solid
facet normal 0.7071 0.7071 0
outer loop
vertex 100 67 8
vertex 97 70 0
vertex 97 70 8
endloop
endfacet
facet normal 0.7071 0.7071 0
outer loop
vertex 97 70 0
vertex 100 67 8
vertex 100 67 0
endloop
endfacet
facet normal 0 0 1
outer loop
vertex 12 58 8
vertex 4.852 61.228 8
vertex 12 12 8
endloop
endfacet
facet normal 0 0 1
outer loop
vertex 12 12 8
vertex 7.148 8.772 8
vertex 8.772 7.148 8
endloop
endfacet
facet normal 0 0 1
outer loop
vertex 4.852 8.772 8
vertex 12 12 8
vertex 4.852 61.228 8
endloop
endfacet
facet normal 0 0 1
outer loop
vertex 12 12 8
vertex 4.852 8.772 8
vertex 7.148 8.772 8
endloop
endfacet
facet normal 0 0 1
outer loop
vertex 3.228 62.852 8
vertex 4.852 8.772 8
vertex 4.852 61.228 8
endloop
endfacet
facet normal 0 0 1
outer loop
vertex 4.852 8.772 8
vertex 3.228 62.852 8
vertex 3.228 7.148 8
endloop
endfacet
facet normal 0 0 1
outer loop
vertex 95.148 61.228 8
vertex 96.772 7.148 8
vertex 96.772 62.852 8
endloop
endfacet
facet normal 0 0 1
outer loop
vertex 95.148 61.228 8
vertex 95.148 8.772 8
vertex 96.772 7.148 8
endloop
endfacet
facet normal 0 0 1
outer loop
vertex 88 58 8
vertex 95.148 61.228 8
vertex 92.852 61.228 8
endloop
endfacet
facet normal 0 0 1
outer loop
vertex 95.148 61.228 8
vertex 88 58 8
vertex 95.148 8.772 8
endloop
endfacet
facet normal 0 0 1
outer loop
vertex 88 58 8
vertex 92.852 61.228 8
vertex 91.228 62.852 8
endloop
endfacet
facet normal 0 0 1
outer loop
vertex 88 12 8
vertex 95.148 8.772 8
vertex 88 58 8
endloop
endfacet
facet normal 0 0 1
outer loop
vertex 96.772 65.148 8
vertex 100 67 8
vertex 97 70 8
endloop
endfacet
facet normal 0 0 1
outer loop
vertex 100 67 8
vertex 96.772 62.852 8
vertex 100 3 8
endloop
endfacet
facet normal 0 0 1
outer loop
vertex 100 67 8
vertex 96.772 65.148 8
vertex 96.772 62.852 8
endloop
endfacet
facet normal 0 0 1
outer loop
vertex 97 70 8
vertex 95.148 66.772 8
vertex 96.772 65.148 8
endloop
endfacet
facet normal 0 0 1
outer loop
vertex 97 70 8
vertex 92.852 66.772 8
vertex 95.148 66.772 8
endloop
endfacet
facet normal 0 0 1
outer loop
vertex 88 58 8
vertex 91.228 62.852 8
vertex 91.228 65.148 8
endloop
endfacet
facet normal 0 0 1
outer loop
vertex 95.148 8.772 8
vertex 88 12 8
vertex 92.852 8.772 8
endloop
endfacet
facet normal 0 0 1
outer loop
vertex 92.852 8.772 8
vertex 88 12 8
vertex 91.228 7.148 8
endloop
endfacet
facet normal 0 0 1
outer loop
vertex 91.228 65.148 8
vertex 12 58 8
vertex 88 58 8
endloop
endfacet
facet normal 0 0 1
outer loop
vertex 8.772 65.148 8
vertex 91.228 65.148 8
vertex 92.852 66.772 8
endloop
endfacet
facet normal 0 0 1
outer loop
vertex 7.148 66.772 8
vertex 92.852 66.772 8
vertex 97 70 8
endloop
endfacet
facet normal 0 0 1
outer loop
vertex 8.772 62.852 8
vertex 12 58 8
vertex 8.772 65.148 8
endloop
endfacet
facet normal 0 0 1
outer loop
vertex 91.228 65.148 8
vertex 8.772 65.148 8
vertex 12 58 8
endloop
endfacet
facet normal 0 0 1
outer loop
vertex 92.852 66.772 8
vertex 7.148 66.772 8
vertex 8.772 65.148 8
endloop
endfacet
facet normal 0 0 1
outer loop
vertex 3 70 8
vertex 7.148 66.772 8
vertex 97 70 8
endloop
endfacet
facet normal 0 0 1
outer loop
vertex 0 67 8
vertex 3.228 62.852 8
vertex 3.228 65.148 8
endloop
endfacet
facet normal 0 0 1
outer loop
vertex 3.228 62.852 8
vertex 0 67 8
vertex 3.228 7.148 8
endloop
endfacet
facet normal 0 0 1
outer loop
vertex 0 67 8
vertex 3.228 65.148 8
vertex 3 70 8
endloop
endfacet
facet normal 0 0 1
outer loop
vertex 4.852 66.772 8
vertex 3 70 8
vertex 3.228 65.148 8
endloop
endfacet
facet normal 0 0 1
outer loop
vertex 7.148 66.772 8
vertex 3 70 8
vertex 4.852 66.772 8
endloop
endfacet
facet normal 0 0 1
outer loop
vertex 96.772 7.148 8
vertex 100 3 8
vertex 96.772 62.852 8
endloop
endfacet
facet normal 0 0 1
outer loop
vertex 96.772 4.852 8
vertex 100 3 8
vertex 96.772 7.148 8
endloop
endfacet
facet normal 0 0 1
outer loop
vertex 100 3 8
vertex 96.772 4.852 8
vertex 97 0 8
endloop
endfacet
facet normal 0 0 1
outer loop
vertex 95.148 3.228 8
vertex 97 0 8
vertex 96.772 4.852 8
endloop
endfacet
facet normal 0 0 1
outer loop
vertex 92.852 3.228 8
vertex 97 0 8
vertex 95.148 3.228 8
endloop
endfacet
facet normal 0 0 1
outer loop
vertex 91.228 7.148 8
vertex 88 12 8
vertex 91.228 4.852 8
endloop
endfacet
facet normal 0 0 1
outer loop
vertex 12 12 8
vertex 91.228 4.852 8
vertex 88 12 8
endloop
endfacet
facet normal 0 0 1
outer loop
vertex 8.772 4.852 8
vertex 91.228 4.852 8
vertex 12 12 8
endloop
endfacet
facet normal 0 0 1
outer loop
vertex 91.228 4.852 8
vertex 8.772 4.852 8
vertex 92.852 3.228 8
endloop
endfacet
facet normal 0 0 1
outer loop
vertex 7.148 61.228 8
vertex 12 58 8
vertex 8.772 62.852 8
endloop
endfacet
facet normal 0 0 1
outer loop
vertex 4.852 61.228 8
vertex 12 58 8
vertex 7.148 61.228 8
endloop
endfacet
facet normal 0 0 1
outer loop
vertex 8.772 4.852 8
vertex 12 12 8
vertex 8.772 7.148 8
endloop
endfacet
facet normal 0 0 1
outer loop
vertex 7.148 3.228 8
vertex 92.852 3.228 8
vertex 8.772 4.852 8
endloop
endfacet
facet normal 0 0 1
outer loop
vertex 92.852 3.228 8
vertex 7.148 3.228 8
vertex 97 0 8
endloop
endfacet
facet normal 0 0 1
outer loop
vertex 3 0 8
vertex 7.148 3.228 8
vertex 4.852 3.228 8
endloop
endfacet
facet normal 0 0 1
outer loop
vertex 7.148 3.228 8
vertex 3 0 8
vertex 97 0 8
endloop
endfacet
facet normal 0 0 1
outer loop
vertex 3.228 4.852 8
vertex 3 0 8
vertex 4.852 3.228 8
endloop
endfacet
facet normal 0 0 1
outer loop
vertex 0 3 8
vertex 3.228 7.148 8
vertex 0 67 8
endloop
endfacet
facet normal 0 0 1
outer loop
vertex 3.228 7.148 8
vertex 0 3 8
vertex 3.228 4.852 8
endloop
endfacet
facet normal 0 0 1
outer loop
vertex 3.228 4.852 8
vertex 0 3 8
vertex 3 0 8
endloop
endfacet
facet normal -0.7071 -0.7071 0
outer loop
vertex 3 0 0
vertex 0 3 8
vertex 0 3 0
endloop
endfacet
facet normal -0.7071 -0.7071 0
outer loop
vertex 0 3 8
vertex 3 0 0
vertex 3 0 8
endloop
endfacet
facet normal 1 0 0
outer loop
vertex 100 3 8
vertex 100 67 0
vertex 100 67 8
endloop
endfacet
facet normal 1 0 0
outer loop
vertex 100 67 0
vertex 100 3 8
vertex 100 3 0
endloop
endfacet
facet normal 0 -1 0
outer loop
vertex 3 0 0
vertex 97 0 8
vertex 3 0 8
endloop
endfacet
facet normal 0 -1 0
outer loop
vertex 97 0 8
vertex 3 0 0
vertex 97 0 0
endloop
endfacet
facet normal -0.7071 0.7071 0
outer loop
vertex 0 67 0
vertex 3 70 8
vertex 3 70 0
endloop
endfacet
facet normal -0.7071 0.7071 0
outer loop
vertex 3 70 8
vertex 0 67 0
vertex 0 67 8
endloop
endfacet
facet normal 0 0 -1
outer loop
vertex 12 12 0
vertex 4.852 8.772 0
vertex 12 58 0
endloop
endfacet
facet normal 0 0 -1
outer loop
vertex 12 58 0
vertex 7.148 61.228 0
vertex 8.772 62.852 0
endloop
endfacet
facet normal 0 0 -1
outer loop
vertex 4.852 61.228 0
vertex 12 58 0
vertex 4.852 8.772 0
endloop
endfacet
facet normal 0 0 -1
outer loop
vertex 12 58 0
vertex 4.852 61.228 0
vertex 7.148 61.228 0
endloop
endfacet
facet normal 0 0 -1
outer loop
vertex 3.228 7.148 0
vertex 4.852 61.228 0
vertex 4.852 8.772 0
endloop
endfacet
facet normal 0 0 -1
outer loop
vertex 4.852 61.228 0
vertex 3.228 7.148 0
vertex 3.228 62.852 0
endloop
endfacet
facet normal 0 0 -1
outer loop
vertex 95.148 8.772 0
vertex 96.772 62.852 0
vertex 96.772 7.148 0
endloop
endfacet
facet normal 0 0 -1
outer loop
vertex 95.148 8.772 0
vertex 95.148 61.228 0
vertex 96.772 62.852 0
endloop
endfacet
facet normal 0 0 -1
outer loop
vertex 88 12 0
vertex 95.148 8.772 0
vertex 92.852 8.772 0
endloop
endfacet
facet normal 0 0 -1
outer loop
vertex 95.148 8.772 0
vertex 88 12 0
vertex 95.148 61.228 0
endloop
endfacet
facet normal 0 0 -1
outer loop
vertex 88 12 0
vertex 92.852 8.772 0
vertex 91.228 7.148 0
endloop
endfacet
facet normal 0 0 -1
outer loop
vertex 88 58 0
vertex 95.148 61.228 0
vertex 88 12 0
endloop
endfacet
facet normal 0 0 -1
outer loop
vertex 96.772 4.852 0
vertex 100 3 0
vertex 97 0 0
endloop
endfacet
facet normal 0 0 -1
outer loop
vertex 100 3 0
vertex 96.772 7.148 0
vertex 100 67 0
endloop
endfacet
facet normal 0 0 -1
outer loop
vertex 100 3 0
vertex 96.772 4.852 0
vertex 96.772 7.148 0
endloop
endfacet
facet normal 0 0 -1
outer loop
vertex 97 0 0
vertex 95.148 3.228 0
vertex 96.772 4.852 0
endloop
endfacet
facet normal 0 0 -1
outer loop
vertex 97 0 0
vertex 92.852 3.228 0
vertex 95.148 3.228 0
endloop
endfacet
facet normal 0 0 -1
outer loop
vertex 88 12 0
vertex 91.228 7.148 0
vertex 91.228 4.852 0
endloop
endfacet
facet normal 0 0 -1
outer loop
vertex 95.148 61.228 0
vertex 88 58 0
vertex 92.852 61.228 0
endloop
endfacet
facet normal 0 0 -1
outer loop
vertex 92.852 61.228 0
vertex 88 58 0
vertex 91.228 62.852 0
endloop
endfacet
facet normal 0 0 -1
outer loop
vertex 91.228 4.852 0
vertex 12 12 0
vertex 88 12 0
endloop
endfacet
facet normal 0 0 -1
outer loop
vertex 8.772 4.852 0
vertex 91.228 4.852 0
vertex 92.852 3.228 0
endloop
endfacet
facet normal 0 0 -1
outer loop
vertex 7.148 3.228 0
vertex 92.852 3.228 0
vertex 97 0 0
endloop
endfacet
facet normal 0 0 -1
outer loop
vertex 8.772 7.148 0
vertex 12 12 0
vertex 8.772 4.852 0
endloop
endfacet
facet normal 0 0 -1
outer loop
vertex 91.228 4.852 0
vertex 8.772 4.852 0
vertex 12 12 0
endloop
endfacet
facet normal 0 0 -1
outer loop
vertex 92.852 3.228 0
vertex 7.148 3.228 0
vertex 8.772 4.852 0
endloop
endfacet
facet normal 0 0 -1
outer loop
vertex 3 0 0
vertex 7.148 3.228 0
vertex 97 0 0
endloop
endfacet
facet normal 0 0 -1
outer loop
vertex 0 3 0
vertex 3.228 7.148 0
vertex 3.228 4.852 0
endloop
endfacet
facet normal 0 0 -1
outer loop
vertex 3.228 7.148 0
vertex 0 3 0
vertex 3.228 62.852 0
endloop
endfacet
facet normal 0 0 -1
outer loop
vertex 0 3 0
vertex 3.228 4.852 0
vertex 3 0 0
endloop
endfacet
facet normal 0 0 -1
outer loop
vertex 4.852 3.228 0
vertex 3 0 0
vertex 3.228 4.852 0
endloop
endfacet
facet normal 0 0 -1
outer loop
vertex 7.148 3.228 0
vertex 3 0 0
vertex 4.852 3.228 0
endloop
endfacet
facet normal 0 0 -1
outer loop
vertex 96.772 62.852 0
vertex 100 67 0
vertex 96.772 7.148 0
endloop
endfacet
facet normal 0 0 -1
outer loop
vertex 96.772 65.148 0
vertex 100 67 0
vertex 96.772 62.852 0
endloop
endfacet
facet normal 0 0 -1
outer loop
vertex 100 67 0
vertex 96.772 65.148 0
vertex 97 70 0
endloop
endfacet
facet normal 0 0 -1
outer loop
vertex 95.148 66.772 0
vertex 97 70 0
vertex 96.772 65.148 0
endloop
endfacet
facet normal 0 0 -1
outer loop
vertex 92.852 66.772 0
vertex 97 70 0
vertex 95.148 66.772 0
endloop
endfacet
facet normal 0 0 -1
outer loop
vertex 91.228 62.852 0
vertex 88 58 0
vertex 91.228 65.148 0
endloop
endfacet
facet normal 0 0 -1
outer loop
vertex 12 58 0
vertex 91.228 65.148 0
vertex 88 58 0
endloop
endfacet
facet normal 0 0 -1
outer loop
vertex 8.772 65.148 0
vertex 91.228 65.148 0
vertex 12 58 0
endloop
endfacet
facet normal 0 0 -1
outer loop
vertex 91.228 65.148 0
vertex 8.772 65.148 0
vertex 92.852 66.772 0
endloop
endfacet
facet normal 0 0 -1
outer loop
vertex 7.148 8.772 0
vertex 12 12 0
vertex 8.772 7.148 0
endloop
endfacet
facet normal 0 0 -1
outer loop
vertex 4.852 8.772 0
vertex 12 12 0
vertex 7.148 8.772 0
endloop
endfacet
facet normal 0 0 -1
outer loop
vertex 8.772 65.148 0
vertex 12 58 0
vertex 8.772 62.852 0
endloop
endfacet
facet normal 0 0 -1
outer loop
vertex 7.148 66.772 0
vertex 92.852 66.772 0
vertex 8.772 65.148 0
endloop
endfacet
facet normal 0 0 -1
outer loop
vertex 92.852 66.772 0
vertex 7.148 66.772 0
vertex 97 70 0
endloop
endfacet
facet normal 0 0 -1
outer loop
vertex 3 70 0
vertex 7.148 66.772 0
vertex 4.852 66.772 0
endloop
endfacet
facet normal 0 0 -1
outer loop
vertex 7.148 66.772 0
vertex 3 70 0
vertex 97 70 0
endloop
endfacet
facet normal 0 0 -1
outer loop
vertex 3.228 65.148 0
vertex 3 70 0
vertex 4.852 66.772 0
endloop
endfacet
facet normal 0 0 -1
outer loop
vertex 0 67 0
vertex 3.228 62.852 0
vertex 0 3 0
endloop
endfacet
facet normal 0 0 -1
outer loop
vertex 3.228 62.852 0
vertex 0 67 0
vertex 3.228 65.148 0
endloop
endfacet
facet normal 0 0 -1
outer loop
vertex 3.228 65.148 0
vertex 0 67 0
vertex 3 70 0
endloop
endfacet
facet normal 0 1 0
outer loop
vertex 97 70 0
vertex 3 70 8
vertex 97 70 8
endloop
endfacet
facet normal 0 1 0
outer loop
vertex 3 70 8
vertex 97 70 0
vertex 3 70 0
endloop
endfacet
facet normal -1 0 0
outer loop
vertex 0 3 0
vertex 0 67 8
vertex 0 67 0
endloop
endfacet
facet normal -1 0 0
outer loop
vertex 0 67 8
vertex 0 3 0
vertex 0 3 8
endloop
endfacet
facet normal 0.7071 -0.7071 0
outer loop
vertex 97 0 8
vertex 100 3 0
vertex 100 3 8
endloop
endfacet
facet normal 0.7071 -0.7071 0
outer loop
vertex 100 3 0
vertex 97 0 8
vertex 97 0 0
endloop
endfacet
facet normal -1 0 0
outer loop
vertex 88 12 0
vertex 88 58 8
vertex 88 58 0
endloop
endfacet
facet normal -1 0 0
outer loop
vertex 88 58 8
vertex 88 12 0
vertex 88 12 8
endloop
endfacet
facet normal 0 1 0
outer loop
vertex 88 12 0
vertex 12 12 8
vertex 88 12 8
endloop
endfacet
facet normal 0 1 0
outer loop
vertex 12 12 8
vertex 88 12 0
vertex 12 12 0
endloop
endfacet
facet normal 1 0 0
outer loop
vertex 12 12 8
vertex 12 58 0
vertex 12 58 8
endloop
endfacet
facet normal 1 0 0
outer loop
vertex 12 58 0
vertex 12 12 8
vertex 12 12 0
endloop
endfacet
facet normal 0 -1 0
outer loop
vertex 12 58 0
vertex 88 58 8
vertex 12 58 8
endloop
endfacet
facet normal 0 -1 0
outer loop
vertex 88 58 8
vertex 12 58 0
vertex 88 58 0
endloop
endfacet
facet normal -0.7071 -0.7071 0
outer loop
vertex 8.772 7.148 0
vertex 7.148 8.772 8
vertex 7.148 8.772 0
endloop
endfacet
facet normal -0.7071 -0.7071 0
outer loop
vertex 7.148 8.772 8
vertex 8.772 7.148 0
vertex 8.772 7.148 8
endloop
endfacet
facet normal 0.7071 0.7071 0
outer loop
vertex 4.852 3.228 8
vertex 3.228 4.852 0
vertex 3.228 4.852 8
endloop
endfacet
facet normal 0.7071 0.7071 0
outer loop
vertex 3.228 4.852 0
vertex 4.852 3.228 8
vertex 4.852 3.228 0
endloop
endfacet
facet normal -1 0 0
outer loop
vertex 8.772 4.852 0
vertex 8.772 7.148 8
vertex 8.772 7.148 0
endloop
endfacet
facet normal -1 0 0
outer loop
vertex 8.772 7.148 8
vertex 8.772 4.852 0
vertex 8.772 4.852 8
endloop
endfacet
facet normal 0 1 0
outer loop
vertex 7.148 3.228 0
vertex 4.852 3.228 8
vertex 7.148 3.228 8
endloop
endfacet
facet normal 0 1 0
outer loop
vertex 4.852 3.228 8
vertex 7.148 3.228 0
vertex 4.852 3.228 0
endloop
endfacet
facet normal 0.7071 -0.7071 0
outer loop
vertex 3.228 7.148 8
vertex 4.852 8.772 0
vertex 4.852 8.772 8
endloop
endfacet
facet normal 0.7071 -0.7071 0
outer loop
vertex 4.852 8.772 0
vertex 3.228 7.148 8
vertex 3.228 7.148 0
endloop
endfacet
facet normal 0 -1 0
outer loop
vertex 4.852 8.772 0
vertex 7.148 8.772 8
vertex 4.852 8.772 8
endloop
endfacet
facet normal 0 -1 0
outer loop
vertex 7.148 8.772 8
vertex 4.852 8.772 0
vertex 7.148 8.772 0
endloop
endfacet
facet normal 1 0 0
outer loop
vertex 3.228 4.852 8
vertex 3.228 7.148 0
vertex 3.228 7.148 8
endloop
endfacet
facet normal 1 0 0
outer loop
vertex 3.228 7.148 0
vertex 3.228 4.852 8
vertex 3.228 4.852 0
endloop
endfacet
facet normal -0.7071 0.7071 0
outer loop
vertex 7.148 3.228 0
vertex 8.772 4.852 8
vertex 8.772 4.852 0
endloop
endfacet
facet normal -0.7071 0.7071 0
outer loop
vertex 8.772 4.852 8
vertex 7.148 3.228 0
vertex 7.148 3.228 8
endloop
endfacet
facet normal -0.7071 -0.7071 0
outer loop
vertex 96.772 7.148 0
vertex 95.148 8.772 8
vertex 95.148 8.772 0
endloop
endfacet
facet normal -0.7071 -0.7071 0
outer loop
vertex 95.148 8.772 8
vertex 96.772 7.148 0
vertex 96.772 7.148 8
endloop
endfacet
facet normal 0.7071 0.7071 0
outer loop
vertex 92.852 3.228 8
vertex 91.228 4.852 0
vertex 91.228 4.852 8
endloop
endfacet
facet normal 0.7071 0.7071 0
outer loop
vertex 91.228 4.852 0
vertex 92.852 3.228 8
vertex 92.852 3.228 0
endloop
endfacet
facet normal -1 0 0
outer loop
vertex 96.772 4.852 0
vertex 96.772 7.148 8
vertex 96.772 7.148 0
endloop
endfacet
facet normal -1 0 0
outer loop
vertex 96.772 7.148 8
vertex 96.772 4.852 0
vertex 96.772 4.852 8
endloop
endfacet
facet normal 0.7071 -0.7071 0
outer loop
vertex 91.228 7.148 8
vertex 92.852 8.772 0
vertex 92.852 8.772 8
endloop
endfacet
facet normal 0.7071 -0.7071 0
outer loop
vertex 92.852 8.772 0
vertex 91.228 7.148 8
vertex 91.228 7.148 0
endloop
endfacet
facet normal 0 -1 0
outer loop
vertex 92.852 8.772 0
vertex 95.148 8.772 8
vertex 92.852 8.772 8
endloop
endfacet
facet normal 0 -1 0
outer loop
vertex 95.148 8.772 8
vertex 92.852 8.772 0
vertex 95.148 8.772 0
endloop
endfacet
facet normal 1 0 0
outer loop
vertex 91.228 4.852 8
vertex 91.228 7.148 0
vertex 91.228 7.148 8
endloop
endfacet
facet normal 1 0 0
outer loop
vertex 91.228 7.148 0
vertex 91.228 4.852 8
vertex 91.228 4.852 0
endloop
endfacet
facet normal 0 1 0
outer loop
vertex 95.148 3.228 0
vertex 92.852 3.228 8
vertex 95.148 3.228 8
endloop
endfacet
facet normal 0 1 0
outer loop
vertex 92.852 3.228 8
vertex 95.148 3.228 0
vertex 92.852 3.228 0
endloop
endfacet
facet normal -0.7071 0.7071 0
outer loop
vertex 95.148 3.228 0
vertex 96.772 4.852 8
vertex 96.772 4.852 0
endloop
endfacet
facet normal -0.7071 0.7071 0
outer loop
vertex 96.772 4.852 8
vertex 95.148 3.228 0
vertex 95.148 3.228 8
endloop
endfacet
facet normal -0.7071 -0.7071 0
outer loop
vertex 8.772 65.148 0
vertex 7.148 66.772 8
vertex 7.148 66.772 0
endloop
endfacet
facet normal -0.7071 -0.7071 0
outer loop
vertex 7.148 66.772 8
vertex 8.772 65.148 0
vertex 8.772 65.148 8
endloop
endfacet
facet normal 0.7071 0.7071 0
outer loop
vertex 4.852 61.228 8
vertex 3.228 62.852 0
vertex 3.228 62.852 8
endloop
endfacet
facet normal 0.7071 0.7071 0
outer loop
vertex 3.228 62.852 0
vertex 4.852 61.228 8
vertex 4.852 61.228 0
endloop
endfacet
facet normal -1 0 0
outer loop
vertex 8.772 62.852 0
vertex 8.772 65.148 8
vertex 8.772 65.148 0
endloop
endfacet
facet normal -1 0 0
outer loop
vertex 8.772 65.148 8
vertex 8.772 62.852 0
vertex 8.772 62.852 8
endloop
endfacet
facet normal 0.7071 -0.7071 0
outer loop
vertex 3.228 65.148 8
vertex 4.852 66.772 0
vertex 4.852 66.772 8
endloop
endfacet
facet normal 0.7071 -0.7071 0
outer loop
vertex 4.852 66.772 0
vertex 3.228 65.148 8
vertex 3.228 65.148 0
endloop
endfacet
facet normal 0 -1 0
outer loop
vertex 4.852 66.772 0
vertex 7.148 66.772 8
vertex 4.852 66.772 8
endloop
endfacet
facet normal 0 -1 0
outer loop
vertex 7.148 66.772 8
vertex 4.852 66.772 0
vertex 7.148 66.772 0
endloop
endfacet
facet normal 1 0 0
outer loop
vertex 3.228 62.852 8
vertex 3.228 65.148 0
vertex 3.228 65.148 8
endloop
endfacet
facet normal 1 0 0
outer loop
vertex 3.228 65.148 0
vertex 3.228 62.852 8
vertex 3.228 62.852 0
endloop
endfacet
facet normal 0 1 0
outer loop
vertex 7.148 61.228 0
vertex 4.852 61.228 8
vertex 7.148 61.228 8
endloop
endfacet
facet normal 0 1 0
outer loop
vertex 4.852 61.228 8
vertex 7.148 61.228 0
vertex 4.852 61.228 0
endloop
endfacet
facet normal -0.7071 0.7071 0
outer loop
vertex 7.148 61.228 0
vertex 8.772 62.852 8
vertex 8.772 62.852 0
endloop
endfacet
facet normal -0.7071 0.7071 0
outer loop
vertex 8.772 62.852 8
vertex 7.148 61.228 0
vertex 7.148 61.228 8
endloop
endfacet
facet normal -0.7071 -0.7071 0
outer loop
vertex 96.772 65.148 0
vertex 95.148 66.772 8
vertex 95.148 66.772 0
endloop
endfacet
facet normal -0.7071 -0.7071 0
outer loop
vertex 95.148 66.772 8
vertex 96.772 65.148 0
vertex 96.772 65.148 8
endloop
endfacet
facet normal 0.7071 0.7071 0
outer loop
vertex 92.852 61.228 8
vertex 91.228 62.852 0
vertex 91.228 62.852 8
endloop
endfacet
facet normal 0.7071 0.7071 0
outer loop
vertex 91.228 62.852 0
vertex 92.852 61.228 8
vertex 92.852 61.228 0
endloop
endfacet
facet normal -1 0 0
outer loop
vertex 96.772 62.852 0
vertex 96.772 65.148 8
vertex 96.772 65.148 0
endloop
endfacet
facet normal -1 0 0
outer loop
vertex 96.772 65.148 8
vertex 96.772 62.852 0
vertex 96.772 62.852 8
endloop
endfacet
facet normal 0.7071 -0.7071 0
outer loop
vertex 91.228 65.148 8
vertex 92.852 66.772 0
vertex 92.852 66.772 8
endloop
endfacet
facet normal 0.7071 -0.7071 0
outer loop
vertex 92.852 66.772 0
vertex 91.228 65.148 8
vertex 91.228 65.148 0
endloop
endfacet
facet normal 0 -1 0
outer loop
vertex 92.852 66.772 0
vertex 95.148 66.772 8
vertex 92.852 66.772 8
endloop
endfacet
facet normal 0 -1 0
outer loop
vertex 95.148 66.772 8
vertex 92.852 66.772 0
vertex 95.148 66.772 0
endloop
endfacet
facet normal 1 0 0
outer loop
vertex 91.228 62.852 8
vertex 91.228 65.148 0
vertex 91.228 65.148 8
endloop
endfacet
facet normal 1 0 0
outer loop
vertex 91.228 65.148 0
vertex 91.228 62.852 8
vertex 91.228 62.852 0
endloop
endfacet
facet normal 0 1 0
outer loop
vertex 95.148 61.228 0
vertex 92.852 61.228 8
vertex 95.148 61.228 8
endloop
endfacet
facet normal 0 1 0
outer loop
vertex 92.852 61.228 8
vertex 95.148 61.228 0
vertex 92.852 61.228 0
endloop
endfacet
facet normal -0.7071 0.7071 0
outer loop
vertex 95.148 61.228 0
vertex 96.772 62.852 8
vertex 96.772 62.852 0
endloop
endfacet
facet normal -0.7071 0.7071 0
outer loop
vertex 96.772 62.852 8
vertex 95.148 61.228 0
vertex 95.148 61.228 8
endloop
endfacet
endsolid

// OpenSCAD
$fn = 32;

// ----------------------------------------------------------------------
// Frame plate: 100 x 70 frame, 12 mm rails
// ----------------------------------------------------------------------

// --- parameters (mm) ---
plate_l = 100;            // plate length, X
plate_w = 70;             // plate width, Y
plate_t = 8;              // plate thickness, Z (extrusion height)
corner_c = 3;             // corner chamfer
frame_bar = 12;           // frame rail width
bolt_r = 3;               // corner bolt window radius
bolt_inset = 6;           // bolt centre inset from the edges

win_l = plate_l - 2 * frame_bar;  // window length
win_w = plate_w - 2 * frame_bar;  // window width
bolt_d = 2 * bolt_r;  // corner hole diameter

profile = [[3, 0], [97, 0], [100, 3], [100, 67], [97, 70], [3, 70], [0, 67], [0, 3]];  // primary outline, 8 points, counter clockwise
void_1 = [[12, 12], [88, 12], [88, 58], [12, 58]];  // the window, 4 points
void_2 = [[8.772, 7.148], [7.148, 8.772], [4.852, 8.772], [3.228, 7.148], [3.228, 4.852], [4.852, 3.228], [7.148, 3.228], [8.772, 4.852]];  // corner bolt window, 8 points
void_3 = [[96.772, 7.148], [95.148, 8.772], [92.852, 8.772], [91.228, 7.148], [91.228, 4.852], [92.852, 3.228], [95.148, 3.228], [96.772, 4.852]];  // corner bolt window, 8 points
void_4 = [[8.772, 65.148], [7.148, 66.772], [4.852, 66.772], [3.228, 65.148], [3.228, 62.852], [4.852, 61.228], [7.148, 61.228], [8.772, 62.852]];  // corner bolt window, 8 points
void_5 = [[96.772, 65.148], [95.148, 66.772], [92.852, 66.772], [91.228, 65.148], [91.228, 62.852], [92.852, 61.228], [95.148, 61.228], [96.772, 62.852]];  // corner bolt window, 8 points

// --- the one profile operation ---
difference() {
  linear_extrude(height = plate_t) polygon(points = profile);
  translate([0, 0, -1])
    linear_extrude(height = plate_t + 2) polygon(points = void_1);
  translate([0, 0, -1])
    linear_extrude(height = plate_t + 2) polygon(points = void_2);
  translate([0, 0, -1])
    linear_extrude(height = plate_t + 2) polygon(points = void_3);
  translate([0, 0, -1])
    linear_extrude(height = plate_t + 2) polygon(points = void_4);
  translate([0, 0, -1])
    linear_extrude(height = plate_t + 2) polygon(points = void_5);
}
